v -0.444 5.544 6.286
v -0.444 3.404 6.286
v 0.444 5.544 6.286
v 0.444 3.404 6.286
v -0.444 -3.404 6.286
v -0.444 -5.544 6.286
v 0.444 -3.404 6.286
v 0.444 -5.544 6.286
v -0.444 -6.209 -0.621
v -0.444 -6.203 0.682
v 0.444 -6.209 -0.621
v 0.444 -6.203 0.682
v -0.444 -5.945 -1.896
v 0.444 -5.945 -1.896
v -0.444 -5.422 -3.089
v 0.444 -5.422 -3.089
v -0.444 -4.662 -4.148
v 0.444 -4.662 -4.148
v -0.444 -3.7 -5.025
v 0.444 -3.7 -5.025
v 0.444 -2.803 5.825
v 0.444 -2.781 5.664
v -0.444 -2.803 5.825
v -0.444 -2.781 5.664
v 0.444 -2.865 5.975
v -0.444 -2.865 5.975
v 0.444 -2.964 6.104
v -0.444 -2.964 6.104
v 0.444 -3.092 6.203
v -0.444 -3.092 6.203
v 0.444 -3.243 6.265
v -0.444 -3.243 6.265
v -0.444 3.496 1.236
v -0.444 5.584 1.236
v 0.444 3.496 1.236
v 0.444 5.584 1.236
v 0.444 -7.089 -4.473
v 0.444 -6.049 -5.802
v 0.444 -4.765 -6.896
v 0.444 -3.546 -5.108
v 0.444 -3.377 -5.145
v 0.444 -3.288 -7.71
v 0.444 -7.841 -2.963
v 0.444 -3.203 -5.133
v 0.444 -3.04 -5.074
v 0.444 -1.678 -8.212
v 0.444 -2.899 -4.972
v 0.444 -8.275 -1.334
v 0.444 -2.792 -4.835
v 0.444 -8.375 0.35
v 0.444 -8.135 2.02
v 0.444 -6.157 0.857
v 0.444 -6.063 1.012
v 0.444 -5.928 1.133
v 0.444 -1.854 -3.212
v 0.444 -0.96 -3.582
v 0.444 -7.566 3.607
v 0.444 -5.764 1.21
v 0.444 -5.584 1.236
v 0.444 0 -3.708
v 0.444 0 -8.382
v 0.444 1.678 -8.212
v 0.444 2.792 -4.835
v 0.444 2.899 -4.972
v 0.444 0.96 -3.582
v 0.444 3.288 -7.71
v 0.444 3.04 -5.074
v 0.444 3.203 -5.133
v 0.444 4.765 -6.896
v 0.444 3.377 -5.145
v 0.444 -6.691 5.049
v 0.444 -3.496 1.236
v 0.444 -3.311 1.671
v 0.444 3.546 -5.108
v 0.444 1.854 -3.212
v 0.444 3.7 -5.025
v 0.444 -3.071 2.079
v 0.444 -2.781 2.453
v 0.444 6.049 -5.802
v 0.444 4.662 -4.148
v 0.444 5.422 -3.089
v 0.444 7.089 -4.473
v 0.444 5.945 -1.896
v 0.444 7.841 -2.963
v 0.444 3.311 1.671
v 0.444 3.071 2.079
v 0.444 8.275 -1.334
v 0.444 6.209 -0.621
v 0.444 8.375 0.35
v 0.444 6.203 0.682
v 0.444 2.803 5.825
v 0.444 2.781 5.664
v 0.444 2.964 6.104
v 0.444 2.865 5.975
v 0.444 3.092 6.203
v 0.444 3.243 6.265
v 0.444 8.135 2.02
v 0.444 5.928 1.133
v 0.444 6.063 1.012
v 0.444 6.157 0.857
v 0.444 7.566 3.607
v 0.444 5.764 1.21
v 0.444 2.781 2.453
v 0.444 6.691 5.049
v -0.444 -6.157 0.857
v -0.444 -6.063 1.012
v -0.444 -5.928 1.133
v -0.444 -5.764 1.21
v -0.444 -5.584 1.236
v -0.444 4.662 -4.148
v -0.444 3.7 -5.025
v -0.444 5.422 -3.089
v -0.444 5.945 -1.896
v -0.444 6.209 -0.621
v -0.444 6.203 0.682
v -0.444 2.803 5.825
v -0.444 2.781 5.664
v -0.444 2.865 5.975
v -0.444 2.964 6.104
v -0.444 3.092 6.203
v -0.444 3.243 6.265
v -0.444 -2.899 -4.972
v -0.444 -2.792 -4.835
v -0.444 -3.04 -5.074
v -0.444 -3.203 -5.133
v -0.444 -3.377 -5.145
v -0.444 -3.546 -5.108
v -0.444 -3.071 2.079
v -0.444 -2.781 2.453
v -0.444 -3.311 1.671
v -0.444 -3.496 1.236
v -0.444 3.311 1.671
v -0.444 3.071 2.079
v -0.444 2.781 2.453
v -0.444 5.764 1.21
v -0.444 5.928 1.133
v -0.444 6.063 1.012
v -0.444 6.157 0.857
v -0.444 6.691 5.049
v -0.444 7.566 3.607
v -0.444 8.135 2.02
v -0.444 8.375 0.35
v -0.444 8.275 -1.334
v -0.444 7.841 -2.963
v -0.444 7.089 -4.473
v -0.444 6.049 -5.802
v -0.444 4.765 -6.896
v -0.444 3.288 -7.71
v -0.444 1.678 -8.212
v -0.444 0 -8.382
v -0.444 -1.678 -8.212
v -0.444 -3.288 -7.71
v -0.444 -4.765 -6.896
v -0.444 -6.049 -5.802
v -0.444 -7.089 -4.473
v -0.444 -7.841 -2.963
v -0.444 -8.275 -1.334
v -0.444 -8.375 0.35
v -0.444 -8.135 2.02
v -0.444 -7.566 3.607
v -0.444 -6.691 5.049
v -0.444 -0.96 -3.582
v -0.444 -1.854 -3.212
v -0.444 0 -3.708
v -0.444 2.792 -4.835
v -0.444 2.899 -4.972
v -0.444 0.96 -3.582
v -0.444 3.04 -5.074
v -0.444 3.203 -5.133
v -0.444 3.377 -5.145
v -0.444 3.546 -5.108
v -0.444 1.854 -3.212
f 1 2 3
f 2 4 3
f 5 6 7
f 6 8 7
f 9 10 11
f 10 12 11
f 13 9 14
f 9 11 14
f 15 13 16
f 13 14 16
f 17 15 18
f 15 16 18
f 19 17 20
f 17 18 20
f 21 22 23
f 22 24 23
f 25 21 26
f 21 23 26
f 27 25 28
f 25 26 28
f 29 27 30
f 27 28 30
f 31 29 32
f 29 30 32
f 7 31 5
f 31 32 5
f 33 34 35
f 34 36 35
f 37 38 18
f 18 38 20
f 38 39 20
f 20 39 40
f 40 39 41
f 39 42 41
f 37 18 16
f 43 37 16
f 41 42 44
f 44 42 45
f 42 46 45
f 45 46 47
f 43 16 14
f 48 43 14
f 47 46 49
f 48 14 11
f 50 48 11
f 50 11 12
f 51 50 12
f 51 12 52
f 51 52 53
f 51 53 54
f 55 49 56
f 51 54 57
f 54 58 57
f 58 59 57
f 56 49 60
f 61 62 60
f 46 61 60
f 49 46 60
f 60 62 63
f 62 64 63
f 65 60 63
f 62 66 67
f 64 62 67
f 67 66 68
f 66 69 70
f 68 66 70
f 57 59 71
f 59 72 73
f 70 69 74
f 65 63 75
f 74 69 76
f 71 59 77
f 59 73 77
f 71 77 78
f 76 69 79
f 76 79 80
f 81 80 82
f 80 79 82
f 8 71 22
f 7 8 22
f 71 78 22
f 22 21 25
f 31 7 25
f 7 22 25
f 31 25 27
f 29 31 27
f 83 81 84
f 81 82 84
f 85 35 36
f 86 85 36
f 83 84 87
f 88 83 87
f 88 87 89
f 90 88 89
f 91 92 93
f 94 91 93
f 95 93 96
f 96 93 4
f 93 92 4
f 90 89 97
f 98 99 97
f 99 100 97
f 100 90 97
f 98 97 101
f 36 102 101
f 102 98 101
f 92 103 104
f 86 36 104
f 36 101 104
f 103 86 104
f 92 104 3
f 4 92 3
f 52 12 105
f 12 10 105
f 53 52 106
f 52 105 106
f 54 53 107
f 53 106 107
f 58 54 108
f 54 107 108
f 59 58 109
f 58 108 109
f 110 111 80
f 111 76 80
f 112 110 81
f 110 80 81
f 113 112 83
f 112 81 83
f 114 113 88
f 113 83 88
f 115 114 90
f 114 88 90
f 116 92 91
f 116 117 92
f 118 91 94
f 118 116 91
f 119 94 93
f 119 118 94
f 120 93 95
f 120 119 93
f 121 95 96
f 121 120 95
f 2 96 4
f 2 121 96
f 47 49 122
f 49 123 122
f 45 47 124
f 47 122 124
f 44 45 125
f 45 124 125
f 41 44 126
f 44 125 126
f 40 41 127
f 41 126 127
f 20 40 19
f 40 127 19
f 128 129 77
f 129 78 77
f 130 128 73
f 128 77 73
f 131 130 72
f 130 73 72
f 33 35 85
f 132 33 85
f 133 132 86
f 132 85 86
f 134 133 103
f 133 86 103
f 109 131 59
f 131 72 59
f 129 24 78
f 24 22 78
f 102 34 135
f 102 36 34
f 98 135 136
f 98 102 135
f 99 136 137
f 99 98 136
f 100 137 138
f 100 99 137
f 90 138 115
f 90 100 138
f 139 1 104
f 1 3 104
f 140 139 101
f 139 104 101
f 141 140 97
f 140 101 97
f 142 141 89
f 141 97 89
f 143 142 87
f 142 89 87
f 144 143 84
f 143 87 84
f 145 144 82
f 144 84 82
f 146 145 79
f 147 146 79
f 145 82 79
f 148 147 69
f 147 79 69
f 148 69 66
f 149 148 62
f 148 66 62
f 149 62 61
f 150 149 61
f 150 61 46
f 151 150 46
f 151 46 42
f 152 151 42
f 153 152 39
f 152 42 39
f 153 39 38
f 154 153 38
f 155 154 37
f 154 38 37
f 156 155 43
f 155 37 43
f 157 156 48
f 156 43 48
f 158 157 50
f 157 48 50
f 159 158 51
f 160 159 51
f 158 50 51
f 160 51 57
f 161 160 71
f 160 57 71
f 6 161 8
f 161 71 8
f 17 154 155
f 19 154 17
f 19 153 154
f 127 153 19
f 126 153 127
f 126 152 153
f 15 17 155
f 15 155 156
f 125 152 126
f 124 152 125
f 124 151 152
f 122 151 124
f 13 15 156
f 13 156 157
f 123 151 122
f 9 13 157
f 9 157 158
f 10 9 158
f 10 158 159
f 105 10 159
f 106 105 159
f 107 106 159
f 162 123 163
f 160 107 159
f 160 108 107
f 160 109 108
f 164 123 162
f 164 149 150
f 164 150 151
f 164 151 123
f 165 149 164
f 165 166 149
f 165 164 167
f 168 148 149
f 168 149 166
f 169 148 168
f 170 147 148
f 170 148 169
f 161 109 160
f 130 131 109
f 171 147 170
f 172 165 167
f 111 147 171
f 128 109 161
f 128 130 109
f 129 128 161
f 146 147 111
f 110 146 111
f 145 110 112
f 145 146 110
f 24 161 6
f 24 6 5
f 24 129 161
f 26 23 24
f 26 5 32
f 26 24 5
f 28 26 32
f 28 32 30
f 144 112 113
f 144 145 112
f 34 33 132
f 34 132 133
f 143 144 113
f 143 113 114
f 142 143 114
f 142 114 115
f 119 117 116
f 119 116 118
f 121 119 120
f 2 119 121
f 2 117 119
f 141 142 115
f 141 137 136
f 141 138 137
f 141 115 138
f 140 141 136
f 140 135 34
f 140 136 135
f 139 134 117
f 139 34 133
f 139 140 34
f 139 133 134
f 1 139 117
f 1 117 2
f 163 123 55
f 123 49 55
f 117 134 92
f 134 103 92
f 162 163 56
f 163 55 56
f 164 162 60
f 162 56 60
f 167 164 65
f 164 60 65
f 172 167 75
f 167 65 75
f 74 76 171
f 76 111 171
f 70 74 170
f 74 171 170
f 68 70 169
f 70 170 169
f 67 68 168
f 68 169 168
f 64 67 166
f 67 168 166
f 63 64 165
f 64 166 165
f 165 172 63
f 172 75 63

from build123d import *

# Parameters (mm, degrees)
EXTRUDE1_DEPTH = 0.4445
FILLET1_R      = 0.6223


with BuildPart() as part:
    # Sketch1 → Extrude1 (new body, symmetric)
    with BuildSketch(Plane(origin=(0, 0, 0), x_dir=(0, 0, -1), z_dir=(1, 0, 0))):
        with BuildLine():
            Line((-2.45287604, 2.7813), (-6.2865, 2.7813))
            Line((-6.2865, 2.7813), (-6.2865, 5.544171872))
            ThreePointArc((-6.2865, 5.544171872), (8.382, 0), (-6.2865, -5.544171872))
            Line((-6.2865, -5.544171872), (-6.2865, -2.7813))
            Line((-6.2865, -2.7813), (-2.45287604, -2.7813))
            ThreePointArc((-2.45287604, -2.7813), (-1.878831673, -3.197220997), (-1.236133333, -3.49631305))
            Line((-1.236133333, -3.49631305), (-1.236133333, -6.116547306))
            ThreePointArc((-1.236133333, -6.116547306), (2.566674294, -5.687913469), (5.404177312, -3.120103226))
            Line((5.404177312, -3.120103226), (3.211568607, -1.8542))
            ThreePointArc((3.211568607, -1.8542), (3.7084, 0), (3.211568607, 1.8542))
            Line((3.211568607, 1.8542), (5.404177312, 3.120103226))
            ThreePointArc((5.404177312, 3.120103226), (2.566674294, 5.687913469), (-1.236133333, 6.116547306))
            Line((-1.236133333, 6.116547306), (-1.236133333, 3.49631305))
            ThreePointArc((-1.236133333, 3.49631305), (-1.878831673, 3.197220997), (-2.45287604, 2.7813))
        make_face()
    extrude(amount=EXTRUDE1_DEPTH, both=True)

    # Fillet1
    fillet1_edges = [part.edges().sort_by_distance(p)[0] for p in [
        (0, -2.7813, 6.2865),
        (0, -6.116547306, 1.236133333),
        (0, -3.120103226, -5.404177312),
        (0, 3.120103226, -5.404177312),
        (0, 6.116547306, 1.236133333),
        (0, 2.7813, 6.2865),
    ]]
    fillet(fillet1_edges, radius=FILLET1_R)


solid = part.part
